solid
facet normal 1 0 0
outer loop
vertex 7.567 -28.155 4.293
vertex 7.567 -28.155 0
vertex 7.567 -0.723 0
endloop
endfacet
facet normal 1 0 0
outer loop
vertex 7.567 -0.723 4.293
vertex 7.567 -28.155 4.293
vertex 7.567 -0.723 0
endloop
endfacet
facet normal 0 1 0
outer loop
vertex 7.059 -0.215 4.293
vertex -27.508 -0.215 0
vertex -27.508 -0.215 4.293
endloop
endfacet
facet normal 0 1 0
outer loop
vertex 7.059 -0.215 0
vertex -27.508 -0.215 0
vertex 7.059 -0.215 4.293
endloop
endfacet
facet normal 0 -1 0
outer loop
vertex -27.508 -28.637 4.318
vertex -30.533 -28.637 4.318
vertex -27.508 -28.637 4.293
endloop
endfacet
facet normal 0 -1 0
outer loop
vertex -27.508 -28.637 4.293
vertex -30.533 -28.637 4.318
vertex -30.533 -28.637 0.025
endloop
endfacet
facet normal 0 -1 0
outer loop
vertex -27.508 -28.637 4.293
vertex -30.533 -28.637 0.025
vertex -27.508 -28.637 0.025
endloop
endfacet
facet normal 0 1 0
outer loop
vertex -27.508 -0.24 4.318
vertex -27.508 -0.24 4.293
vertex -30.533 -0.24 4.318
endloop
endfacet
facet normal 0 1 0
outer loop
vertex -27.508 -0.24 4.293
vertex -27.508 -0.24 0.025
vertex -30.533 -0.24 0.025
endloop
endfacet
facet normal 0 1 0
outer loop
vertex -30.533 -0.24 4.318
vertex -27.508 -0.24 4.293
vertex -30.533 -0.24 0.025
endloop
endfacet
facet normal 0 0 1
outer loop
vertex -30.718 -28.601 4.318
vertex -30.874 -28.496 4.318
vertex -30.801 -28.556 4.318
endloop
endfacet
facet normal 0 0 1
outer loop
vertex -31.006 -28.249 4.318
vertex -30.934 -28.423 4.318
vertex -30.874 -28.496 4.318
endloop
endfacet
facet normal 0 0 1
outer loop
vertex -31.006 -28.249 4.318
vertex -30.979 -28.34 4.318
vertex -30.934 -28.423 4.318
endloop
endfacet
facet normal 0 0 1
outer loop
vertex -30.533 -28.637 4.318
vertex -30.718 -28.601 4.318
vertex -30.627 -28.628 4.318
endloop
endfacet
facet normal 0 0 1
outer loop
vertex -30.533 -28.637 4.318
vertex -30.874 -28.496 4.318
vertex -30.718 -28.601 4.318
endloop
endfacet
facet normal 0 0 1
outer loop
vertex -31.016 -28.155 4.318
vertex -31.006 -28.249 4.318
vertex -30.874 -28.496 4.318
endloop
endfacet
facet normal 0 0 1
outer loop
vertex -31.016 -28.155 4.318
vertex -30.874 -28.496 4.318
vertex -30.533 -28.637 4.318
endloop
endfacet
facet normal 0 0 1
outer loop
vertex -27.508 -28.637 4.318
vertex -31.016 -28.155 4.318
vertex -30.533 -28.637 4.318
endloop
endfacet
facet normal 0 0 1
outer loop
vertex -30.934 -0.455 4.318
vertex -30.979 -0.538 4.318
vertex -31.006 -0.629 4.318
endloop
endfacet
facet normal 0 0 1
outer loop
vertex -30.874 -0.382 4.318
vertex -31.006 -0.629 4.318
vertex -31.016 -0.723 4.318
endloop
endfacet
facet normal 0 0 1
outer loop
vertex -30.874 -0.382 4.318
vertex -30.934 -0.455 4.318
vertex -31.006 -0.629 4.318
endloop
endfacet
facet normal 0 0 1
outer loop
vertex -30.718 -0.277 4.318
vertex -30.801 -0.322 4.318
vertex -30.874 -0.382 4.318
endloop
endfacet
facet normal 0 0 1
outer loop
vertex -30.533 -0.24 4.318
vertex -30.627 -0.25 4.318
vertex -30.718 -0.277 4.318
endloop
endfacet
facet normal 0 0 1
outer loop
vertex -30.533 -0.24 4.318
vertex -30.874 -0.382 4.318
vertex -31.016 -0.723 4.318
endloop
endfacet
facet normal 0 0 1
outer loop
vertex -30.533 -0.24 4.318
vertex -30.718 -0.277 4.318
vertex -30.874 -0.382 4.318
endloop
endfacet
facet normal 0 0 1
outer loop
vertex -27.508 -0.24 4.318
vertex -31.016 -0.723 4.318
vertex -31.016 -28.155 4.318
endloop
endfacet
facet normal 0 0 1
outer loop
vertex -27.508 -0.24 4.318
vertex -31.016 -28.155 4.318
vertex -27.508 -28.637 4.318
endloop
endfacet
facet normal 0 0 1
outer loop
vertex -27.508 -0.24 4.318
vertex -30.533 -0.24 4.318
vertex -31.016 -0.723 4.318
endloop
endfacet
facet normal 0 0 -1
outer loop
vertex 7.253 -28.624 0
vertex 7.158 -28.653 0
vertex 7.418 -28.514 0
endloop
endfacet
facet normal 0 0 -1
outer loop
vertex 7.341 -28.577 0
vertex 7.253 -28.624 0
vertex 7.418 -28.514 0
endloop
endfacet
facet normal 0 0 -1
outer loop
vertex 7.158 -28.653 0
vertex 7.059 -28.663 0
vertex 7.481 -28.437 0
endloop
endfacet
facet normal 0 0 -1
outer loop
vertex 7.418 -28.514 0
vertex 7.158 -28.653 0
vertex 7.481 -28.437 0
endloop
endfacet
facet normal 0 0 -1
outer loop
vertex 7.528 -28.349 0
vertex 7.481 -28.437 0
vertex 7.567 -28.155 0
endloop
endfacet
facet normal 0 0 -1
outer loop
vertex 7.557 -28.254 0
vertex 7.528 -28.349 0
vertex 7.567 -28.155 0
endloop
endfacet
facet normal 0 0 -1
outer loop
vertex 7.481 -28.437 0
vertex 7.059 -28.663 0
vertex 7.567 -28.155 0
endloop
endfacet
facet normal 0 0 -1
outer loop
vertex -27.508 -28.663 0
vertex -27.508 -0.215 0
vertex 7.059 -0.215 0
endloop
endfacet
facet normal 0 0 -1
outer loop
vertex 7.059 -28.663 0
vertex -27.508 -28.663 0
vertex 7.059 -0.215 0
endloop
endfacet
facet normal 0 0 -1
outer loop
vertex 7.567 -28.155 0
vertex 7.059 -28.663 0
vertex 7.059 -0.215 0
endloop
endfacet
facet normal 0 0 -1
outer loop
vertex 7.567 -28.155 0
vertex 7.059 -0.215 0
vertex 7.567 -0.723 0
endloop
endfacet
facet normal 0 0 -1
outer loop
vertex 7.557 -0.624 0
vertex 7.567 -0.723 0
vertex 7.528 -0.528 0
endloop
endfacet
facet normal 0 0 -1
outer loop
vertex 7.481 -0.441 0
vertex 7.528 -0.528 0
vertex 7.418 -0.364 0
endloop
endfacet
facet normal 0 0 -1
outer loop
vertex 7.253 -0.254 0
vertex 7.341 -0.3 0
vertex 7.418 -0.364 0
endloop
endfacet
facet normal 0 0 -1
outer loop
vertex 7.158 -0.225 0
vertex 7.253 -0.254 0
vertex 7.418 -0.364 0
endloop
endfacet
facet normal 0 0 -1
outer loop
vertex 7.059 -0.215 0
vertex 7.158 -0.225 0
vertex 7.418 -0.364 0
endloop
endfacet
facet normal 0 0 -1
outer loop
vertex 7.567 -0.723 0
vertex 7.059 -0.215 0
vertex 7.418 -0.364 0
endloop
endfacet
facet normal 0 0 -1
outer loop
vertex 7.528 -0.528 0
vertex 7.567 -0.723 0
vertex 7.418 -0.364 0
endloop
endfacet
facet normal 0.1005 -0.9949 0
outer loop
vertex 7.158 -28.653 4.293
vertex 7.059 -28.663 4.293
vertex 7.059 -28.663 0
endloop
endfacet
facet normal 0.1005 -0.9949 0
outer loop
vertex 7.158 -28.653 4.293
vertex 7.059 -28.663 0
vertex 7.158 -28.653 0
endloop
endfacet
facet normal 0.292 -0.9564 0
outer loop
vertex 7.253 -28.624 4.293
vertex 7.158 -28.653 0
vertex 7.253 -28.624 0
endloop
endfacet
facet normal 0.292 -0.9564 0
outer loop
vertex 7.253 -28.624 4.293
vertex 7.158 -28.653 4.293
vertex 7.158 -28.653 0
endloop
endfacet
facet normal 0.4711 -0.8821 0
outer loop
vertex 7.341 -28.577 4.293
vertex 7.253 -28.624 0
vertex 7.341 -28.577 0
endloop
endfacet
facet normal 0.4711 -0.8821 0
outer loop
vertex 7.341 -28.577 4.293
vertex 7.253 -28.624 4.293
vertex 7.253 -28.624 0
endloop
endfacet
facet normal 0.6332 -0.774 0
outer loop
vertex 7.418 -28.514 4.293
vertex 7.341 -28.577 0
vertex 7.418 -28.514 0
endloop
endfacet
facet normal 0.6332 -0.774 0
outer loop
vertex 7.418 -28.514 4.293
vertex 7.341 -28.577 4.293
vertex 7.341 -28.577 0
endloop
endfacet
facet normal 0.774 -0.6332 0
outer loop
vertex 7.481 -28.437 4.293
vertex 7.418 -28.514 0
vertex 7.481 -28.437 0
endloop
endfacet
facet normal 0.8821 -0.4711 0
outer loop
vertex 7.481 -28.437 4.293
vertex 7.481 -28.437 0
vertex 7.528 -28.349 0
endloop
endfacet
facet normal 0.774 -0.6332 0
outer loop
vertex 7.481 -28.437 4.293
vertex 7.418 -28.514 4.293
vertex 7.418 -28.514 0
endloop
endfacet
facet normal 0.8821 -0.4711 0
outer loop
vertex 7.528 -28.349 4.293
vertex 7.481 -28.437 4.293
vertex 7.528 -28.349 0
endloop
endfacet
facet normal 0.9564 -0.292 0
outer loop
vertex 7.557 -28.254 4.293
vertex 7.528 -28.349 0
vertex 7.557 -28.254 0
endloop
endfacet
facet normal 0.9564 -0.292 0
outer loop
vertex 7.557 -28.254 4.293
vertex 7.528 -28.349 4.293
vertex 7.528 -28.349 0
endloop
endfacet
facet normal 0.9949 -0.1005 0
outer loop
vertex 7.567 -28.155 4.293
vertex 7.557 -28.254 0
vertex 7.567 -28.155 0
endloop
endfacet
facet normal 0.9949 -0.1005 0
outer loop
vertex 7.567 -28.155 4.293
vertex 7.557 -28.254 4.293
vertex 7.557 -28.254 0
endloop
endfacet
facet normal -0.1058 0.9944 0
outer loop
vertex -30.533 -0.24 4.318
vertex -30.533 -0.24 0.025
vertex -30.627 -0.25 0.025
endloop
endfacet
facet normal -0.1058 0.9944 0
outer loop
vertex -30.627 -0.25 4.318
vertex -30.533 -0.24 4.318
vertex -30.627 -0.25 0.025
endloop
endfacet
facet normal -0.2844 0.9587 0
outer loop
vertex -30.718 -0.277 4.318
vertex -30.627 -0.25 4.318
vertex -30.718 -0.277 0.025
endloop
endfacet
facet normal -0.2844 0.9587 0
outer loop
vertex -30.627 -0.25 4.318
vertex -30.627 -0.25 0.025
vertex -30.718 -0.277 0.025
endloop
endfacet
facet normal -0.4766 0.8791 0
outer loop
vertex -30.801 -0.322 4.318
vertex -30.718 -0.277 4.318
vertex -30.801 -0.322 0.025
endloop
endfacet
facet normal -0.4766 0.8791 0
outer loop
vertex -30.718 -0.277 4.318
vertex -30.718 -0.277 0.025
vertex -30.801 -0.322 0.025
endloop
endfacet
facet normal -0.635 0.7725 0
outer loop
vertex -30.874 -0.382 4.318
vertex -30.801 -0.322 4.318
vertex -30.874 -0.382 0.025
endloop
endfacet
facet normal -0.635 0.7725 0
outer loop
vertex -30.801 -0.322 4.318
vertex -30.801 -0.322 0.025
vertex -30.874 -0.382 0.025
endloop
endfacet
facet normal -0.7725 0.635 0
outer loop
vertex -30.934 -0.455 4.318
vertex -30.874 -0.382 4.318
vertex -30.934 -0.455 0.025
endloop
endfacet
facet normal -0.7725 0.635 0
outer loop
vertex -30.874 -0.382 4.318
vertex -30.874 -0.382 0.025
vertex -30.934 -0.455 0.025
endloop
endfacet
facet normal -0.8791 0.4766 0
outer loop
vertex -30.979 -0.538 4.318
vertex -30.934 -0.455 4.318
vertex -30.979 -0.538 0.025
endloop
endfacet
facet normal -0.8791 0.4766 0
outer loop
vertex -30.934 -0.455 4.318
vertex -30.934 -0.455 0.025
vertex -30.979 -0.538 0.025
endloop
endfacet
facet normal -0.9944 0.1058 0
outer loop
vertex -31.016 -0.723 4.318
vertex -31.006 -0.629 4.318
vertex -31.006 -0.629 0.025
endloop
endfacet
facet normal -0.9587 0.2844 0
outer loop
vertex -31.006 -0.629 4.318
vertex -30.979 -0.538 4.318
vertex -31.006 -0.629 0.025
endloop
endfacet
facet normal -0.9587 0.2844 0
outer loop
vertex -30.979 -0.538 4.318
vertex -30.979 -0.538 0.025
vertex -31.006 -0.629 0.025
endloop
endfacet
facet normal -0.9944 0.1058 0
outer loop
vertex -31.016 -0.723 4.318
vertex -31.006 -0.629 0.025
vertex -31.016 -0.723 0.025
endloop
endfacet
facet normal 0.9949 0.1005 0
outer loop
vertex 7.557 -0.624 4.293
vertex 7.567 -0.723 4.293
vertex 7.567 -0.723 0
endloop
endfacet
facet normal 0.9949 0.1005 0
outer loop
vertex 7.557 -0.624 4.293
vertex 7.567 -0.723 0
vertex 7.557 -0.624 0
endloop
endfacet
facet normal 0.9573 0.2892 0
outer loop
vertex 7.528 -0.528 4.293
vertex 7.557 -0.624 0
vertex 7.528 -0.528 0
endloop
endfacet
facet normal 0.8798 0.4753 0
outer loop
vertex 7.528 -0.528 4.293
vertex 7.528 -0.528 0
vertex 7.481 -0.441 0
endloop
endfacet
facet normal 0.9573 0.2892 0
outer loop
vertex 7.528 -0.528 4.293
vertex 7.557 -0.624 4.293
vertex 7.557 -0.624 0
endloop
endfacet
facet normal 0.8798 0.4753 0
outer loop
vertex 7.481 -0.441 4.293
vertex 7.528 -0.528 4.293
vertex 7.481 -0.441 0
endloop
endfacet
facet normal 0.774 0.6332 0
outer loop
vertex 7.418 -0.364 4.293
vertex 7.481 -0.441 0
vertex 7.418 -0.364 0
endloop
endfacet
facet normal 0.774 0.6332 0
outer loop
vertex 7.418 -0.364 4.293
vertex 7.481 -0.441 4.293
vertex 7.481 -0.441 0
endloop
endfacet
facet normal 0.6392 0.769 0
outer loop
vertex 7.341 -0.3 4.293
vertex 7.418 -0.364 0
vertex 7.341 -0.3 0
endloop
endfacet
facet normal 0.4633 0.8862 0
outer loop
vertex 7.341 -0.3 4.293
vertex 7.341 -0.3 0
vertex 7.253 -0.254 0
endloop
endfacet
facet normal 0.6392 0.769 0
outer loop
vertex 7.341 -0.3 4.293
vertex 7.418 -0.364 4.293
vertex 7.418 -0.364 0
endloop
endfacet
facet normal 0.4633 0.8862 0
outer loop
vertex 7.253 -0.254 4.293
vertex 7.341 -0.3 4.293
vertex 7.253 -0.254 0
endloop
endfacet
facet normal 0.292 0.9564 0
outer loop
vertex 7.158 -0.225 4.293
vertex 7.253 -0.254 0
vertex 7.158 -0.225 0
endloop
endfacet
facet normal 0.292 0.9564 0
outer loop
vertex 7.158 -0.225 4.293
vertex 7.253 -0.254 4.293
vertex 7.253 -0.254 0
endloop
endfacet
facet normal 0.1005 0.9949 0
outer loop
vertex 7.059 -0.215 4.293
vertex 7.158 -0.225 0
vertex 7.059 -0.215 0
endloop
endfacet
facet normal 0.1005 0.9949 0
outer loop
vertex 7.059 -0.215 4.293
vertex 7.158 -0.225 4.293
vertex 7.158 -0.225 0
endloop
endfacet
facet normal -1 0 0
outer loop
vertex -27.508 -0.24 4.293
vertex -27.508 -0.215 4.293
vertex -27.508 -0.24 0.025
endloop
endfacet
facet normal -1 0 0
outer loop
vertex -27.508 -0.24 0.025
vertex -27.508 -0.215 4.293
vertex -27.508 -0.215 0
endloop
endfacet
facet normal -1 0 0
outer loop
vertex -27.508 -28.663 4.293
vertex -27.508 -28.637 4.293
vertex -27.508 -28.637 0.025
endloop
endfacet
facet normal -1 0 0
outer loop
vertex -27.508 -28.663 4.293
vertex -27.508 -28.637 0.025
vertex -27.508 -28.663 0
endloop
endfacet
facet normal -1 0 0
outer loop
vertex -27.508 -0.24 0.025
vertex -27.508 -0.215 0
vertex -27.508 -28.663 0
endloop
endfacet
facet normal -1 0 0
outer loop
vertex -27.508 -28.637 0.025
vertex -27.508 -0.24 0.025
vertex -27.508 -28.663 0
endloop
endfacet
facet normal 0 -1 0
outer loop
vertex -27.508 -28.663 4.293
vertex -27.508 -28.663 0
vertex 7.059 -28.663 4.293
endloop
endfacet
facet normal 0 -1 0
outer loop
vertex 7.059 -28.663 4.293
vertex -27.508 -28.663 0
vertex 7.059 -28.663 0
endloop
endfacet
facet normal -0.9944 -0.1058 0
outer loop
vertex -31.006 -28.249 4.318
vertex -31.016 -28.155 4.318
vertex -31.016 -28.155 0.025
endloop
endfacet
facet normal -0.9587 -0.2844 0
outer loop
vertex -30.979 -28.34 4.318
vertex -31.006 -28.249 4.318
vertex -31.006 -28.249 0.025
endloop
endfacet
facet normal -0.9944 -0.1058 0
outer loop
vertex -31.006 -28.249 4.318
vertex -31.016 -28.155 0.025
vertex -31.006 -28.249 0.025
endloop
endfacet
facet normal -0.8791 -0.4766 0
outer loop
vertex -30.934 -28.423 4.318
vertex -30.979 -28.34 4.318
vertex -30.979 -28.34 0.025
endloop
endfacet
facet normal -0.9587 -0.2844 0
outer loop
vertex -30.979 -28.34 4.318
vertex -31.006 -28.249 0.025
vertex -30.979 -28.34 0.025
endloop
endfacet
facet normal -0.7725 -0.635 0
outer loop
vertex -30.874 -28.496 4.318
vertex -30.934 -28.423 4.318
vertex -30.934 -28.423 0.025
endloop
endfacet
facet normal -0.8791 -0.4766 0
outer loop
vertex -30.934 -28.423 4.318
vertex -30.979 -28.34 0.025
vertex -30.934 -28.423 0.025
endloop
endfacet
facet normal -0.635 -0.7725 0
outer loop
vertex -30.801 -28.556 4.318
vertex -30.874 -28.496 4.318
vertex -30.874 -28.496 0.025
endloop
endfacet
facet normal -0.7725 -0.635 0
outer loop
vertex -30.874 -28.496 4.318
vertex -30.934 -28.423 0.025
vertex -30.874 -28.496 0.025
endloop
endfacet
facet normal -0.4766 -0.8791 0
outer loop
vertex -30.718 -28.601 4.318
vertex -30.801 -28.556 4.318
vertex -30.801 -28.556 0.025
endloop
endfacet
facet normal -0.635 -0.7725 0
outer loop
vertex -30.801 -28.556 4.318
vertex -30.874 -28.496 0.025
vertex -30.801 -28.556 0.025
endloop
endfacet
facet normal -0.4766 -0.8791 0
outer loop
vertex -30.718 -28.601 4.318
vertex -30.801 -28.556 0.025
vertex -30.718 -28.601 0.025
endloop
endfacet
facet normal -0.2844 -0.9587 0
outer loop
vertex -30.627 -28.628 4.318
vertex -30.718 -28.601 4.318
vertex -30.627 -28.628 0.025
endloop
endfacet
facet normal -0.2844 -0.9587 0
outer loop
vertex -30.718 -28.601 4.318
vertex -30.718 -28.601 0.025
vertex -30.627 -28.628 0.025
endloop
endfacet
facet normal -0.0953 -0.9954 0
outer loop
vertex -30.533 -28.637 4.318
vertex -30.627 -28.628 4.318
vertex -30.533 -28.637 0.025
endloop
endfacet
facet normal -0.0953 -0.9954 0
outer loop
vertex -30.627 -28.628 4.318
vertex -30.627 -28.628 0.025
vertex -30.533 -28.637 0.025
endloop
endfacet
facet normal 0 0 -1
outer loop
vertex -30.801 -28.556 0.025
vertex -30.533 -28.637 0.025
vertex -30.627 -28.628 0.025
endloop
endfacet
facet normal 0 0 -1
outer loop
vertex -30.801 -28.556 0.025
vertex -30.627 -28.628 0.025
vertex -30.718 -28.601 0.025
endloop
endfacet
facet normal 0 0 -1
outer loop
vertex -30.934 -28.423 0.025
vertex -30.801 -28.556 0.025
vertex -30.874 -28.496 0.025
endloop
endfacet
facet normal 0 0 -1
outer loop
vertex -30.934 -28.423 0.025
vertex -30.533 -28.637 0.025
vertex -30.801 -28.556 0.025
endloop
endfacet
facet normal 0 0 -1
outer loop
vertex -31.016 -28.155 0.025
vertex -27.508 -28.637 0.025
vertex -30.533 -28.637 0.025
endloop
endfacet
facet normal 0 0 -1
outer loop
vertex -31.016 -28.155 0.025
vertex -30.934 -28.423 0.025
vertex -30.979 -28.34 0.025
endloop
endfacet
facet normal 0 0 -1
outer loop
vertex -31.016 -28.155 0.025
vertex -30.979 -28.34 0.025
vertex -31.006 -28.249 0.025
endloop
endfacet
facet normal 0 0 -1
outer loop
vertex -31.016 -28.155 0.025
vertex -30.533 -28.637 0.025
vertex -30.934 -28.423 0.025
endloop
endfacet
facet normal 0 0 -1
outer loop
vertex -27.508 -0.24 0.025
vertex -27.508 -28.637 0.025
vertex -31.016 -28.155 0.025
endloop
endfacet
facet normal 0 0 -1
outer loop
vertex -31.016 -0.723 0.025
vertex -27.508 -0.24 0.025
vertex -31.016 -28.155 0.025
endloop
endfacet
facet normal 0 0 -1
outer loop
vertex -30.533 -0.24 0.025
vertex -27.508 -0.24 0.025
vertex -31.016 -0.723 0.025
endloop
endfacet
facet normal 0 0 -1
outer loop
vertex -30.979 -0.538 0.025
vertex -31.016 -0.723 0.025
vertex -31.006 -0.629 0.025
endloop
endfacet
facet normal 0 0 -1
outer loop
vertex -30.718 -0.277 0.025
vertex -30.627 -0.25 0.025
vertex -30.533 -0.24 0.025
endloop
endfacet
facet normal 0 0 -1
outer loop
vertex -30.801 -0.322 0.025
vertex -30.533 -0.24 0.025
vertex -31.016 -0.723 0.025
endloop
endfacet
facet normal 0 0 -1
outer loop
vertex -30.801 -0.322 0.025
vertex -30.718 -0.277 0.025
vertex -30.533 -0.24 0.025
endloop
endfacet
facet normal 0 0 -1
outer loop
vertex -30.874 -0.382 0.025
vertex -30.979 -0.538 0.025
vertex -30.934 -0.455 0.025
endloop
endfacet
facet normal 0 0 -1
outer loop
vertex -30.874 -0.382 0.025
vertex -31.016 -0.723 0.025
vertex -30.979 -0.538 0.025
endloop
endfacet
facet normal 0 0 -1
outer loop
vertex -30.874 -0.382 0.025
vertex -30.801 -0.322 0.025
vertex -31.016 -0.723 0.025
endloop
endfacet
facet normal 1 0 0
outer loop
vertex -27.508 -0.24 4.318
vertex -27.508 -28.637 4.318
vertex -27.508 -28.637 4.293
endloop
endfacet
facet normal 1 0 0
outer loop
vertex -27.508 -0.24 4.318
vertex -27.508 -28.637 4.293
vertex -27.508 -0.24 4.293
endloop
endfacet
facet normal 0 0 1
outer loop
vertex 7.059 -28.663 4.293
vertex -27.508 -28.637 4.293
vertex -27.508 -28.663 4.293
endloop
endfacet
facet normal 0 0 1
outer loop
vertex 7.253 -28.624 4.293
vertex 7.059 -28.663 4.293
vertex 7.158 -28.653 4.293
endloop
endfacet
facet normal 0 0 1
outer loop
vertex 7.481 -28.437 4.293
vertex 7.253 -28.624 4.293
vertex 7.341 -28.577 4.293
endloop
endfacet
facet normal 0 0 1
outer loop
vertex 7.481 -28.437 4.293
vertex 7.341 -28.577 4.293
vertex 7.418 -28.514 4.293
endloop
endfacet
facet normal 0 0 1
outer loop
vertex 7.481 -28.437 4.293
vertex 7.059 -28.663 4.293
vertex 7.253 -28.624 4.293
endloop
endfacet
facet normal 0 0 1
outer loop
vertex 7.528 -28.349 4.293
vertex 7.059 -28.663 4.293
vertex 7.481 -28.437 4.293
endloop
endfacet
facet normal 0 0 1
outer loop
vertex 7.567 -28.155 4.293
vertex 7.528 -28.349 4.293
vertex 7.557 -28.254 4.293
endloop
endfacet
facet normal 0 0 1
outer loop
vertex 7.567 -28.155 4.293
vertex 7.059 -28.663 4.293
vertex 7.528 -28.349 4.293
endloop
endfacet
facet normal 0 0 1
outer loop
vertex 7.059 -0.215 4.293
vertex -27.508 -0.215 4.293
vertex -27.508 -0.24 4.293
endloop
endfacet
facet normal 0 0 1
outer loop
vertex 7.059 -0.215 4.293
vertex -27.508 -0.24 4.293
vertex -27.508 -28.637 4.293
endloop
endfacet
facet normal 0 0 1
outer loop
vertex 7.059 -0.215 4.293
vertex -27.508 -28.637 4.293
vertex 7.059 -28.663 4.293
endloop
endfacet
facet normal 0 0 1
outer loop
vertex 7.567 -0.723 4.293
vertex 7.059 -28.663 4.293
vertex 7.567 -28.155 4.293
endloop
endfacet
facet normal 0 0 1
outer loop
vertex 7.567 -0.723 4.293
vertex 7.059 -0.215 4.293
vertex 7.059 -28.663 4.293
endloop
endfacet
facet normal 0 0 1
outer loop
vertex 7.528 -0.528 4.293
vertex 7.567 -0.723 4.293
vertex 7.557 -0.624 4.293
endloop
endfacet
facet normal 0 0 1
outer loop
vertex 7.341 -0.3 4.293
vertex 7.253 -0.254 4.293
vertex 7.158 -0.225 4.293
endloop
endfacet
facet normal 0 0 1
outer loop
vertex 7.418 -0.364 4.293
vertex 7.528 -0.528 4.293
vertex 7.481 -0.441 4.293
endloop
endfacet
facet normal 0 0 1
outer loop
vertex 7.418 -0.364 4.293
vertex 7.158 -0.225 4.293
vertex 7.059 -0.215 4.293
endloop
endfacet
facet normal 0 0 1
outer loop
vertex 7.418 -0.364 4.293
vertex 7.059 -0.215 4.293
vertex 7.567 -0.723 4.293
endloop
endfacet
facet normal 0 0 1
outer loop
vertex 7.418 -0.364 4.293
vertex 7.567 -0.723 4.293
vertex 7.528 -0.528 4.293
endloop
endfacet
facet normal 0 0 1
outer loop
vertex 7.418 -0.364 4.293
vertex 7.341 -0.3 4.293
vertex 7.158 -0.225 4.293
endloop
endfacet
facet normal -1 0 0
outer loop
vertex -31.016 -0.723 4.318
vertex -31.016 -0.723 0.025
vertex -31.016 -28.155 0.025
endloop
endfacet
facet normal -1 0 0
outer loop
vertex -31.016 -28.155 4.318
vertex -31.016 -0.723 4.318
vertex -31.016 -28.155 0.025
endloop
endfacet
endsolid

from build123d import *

# Parameters (mm, degrees)
SKETCH1_W           = 38.608
SKETCH1_H           = 28.448
BOSS_EXTRUDE1_DEPTH = 4.318
FILLET1_R           = 0.508
CUT_EXTRUDE1_DEPTH  = 0.0254
CUT_EXTRUDE2_DEPTH  = 5.318
SKETCH4_W           = 40.052810536
SKETCH4_H           = 38.466208511
CUT_EXTRUDE3_DEPTH  = 0.0254


with BuildPart() as part:
    # Sketch1 → Boss-Extrude1 (new body)
    with BuildSketch(Plane.XY):
        with Locations((-11.737014375, -14.438872145)):
            Rectangle(SKETCH1_W, SKETCH1_H)
    extrude(amount=BOSS_EXTRUDE1_DEPTH)

    # Fillet1
    fillet1_edges = [part.edges().sort_by_distance(p)[0] for p in [
        (-31.041014375, -0.214872145, 2.159),
        (7.566985625, -0.214872145, 2.159),
        (7.566985625, -28.662872145, 2.159),
        (-31.041014375, -28.662872145, 2.159),
    ]]
    fillet(fillet1_edges, radius=FILLET1_R)

    # Sketch2 → Cut-Extrude1 (cut)
    with BuildSketch(Plane(origin=(0, 0, 0), x_dir=(-1, 0, 0), z_dir=(0, 0, -1))):
        with BuildLine():
            Line((30.533014375, -0.240272145), (27.508194832, -0.240272145))
            Line((27.508194832, -0.240272145), (27.508194832, -28.637472145))
            Line((27.508194832, -28.637472145), (30.533014375, -28.637472145))
            ThreePointArc((30.533014375, -28.637472145), (30.874264108, -28.496121878), (31.015614375, -28.154872145))
            Line((31.015614375, -28.154872145), (31.015614375, -0.722872145))
            ThreePointArc((31.015614375, -0.722872145), (30.874264108, -0.381622412), (30.533014375, -0.240272145))
        make_face()
    extrude(amount=-CUT_EXTRUDE1_DEPTH, mode=Mode.SUBTRACT)

    # Sketch3 → Cut-Extrude2 (cut, through all)
    with BuildSketch(Plane(origin=(0, 0, 0), x_dir=(-1, 0, 0), z_dir=(0, 0, -1))):
        with BuildLine():
            Line((30.533014375, -0.214872145), (27.508194832, -0.214872145))
            Line((27.508194832, -0.214872145), (27.508194832, -0.240272145))
            Line((27.508194832, -0.240272145), (30.533014375, -0.240272145))
            ThreePointArc((30.533014375, -0.240272145), (30.874264108, -0.381622412), (31.015614375, -0.722872145))
            Line((31.015614375, -0.722872145), (31.015614375, -28.154872145))
            ThreePointArc((31.015614375, -28.154872145), (30.874264108, -28.496121878), (30.533014375, -28.637472145))
            Line((30.533014375, -28.637472145), (27.508194832, -28.637472145))
            Line((27.508194832, -28.637472145), (27.508194832, -28.662872145))
            Line((27.508194832, -28.662872145), (30.533014375, -28.662872145))
            ThreePointArc((30.533014375, -28.662872145), (30.89222462, -28.51408239), (31.041014375, -28.154872145))
            Line((31.041014375, -28.154872145), (31.041014375, -0.722872145))
            ThreePointArc((31.041014375, -0.722872145), (30.89222462, -0.3636619), (30.533014375, -0.214872145))
        make_face()
    extrude(amount=-CUT_EXTRUDE2_DEPTH, mode=Mode.SUBTRACT)

    # Sketch4 → Cut-Extrude3 (cut)
    with BuildSketch(Plane.XY.offset(4.318)):
        with Locations((-7.481789564, -12.895374115)):
            Rectangle(SKETCH4_W, SKETCH4_H)
    extrude(amount=-CUT_EXTRUDE3_DEPTH, mode=Mode.SUBTRACT)


solid = part.part
